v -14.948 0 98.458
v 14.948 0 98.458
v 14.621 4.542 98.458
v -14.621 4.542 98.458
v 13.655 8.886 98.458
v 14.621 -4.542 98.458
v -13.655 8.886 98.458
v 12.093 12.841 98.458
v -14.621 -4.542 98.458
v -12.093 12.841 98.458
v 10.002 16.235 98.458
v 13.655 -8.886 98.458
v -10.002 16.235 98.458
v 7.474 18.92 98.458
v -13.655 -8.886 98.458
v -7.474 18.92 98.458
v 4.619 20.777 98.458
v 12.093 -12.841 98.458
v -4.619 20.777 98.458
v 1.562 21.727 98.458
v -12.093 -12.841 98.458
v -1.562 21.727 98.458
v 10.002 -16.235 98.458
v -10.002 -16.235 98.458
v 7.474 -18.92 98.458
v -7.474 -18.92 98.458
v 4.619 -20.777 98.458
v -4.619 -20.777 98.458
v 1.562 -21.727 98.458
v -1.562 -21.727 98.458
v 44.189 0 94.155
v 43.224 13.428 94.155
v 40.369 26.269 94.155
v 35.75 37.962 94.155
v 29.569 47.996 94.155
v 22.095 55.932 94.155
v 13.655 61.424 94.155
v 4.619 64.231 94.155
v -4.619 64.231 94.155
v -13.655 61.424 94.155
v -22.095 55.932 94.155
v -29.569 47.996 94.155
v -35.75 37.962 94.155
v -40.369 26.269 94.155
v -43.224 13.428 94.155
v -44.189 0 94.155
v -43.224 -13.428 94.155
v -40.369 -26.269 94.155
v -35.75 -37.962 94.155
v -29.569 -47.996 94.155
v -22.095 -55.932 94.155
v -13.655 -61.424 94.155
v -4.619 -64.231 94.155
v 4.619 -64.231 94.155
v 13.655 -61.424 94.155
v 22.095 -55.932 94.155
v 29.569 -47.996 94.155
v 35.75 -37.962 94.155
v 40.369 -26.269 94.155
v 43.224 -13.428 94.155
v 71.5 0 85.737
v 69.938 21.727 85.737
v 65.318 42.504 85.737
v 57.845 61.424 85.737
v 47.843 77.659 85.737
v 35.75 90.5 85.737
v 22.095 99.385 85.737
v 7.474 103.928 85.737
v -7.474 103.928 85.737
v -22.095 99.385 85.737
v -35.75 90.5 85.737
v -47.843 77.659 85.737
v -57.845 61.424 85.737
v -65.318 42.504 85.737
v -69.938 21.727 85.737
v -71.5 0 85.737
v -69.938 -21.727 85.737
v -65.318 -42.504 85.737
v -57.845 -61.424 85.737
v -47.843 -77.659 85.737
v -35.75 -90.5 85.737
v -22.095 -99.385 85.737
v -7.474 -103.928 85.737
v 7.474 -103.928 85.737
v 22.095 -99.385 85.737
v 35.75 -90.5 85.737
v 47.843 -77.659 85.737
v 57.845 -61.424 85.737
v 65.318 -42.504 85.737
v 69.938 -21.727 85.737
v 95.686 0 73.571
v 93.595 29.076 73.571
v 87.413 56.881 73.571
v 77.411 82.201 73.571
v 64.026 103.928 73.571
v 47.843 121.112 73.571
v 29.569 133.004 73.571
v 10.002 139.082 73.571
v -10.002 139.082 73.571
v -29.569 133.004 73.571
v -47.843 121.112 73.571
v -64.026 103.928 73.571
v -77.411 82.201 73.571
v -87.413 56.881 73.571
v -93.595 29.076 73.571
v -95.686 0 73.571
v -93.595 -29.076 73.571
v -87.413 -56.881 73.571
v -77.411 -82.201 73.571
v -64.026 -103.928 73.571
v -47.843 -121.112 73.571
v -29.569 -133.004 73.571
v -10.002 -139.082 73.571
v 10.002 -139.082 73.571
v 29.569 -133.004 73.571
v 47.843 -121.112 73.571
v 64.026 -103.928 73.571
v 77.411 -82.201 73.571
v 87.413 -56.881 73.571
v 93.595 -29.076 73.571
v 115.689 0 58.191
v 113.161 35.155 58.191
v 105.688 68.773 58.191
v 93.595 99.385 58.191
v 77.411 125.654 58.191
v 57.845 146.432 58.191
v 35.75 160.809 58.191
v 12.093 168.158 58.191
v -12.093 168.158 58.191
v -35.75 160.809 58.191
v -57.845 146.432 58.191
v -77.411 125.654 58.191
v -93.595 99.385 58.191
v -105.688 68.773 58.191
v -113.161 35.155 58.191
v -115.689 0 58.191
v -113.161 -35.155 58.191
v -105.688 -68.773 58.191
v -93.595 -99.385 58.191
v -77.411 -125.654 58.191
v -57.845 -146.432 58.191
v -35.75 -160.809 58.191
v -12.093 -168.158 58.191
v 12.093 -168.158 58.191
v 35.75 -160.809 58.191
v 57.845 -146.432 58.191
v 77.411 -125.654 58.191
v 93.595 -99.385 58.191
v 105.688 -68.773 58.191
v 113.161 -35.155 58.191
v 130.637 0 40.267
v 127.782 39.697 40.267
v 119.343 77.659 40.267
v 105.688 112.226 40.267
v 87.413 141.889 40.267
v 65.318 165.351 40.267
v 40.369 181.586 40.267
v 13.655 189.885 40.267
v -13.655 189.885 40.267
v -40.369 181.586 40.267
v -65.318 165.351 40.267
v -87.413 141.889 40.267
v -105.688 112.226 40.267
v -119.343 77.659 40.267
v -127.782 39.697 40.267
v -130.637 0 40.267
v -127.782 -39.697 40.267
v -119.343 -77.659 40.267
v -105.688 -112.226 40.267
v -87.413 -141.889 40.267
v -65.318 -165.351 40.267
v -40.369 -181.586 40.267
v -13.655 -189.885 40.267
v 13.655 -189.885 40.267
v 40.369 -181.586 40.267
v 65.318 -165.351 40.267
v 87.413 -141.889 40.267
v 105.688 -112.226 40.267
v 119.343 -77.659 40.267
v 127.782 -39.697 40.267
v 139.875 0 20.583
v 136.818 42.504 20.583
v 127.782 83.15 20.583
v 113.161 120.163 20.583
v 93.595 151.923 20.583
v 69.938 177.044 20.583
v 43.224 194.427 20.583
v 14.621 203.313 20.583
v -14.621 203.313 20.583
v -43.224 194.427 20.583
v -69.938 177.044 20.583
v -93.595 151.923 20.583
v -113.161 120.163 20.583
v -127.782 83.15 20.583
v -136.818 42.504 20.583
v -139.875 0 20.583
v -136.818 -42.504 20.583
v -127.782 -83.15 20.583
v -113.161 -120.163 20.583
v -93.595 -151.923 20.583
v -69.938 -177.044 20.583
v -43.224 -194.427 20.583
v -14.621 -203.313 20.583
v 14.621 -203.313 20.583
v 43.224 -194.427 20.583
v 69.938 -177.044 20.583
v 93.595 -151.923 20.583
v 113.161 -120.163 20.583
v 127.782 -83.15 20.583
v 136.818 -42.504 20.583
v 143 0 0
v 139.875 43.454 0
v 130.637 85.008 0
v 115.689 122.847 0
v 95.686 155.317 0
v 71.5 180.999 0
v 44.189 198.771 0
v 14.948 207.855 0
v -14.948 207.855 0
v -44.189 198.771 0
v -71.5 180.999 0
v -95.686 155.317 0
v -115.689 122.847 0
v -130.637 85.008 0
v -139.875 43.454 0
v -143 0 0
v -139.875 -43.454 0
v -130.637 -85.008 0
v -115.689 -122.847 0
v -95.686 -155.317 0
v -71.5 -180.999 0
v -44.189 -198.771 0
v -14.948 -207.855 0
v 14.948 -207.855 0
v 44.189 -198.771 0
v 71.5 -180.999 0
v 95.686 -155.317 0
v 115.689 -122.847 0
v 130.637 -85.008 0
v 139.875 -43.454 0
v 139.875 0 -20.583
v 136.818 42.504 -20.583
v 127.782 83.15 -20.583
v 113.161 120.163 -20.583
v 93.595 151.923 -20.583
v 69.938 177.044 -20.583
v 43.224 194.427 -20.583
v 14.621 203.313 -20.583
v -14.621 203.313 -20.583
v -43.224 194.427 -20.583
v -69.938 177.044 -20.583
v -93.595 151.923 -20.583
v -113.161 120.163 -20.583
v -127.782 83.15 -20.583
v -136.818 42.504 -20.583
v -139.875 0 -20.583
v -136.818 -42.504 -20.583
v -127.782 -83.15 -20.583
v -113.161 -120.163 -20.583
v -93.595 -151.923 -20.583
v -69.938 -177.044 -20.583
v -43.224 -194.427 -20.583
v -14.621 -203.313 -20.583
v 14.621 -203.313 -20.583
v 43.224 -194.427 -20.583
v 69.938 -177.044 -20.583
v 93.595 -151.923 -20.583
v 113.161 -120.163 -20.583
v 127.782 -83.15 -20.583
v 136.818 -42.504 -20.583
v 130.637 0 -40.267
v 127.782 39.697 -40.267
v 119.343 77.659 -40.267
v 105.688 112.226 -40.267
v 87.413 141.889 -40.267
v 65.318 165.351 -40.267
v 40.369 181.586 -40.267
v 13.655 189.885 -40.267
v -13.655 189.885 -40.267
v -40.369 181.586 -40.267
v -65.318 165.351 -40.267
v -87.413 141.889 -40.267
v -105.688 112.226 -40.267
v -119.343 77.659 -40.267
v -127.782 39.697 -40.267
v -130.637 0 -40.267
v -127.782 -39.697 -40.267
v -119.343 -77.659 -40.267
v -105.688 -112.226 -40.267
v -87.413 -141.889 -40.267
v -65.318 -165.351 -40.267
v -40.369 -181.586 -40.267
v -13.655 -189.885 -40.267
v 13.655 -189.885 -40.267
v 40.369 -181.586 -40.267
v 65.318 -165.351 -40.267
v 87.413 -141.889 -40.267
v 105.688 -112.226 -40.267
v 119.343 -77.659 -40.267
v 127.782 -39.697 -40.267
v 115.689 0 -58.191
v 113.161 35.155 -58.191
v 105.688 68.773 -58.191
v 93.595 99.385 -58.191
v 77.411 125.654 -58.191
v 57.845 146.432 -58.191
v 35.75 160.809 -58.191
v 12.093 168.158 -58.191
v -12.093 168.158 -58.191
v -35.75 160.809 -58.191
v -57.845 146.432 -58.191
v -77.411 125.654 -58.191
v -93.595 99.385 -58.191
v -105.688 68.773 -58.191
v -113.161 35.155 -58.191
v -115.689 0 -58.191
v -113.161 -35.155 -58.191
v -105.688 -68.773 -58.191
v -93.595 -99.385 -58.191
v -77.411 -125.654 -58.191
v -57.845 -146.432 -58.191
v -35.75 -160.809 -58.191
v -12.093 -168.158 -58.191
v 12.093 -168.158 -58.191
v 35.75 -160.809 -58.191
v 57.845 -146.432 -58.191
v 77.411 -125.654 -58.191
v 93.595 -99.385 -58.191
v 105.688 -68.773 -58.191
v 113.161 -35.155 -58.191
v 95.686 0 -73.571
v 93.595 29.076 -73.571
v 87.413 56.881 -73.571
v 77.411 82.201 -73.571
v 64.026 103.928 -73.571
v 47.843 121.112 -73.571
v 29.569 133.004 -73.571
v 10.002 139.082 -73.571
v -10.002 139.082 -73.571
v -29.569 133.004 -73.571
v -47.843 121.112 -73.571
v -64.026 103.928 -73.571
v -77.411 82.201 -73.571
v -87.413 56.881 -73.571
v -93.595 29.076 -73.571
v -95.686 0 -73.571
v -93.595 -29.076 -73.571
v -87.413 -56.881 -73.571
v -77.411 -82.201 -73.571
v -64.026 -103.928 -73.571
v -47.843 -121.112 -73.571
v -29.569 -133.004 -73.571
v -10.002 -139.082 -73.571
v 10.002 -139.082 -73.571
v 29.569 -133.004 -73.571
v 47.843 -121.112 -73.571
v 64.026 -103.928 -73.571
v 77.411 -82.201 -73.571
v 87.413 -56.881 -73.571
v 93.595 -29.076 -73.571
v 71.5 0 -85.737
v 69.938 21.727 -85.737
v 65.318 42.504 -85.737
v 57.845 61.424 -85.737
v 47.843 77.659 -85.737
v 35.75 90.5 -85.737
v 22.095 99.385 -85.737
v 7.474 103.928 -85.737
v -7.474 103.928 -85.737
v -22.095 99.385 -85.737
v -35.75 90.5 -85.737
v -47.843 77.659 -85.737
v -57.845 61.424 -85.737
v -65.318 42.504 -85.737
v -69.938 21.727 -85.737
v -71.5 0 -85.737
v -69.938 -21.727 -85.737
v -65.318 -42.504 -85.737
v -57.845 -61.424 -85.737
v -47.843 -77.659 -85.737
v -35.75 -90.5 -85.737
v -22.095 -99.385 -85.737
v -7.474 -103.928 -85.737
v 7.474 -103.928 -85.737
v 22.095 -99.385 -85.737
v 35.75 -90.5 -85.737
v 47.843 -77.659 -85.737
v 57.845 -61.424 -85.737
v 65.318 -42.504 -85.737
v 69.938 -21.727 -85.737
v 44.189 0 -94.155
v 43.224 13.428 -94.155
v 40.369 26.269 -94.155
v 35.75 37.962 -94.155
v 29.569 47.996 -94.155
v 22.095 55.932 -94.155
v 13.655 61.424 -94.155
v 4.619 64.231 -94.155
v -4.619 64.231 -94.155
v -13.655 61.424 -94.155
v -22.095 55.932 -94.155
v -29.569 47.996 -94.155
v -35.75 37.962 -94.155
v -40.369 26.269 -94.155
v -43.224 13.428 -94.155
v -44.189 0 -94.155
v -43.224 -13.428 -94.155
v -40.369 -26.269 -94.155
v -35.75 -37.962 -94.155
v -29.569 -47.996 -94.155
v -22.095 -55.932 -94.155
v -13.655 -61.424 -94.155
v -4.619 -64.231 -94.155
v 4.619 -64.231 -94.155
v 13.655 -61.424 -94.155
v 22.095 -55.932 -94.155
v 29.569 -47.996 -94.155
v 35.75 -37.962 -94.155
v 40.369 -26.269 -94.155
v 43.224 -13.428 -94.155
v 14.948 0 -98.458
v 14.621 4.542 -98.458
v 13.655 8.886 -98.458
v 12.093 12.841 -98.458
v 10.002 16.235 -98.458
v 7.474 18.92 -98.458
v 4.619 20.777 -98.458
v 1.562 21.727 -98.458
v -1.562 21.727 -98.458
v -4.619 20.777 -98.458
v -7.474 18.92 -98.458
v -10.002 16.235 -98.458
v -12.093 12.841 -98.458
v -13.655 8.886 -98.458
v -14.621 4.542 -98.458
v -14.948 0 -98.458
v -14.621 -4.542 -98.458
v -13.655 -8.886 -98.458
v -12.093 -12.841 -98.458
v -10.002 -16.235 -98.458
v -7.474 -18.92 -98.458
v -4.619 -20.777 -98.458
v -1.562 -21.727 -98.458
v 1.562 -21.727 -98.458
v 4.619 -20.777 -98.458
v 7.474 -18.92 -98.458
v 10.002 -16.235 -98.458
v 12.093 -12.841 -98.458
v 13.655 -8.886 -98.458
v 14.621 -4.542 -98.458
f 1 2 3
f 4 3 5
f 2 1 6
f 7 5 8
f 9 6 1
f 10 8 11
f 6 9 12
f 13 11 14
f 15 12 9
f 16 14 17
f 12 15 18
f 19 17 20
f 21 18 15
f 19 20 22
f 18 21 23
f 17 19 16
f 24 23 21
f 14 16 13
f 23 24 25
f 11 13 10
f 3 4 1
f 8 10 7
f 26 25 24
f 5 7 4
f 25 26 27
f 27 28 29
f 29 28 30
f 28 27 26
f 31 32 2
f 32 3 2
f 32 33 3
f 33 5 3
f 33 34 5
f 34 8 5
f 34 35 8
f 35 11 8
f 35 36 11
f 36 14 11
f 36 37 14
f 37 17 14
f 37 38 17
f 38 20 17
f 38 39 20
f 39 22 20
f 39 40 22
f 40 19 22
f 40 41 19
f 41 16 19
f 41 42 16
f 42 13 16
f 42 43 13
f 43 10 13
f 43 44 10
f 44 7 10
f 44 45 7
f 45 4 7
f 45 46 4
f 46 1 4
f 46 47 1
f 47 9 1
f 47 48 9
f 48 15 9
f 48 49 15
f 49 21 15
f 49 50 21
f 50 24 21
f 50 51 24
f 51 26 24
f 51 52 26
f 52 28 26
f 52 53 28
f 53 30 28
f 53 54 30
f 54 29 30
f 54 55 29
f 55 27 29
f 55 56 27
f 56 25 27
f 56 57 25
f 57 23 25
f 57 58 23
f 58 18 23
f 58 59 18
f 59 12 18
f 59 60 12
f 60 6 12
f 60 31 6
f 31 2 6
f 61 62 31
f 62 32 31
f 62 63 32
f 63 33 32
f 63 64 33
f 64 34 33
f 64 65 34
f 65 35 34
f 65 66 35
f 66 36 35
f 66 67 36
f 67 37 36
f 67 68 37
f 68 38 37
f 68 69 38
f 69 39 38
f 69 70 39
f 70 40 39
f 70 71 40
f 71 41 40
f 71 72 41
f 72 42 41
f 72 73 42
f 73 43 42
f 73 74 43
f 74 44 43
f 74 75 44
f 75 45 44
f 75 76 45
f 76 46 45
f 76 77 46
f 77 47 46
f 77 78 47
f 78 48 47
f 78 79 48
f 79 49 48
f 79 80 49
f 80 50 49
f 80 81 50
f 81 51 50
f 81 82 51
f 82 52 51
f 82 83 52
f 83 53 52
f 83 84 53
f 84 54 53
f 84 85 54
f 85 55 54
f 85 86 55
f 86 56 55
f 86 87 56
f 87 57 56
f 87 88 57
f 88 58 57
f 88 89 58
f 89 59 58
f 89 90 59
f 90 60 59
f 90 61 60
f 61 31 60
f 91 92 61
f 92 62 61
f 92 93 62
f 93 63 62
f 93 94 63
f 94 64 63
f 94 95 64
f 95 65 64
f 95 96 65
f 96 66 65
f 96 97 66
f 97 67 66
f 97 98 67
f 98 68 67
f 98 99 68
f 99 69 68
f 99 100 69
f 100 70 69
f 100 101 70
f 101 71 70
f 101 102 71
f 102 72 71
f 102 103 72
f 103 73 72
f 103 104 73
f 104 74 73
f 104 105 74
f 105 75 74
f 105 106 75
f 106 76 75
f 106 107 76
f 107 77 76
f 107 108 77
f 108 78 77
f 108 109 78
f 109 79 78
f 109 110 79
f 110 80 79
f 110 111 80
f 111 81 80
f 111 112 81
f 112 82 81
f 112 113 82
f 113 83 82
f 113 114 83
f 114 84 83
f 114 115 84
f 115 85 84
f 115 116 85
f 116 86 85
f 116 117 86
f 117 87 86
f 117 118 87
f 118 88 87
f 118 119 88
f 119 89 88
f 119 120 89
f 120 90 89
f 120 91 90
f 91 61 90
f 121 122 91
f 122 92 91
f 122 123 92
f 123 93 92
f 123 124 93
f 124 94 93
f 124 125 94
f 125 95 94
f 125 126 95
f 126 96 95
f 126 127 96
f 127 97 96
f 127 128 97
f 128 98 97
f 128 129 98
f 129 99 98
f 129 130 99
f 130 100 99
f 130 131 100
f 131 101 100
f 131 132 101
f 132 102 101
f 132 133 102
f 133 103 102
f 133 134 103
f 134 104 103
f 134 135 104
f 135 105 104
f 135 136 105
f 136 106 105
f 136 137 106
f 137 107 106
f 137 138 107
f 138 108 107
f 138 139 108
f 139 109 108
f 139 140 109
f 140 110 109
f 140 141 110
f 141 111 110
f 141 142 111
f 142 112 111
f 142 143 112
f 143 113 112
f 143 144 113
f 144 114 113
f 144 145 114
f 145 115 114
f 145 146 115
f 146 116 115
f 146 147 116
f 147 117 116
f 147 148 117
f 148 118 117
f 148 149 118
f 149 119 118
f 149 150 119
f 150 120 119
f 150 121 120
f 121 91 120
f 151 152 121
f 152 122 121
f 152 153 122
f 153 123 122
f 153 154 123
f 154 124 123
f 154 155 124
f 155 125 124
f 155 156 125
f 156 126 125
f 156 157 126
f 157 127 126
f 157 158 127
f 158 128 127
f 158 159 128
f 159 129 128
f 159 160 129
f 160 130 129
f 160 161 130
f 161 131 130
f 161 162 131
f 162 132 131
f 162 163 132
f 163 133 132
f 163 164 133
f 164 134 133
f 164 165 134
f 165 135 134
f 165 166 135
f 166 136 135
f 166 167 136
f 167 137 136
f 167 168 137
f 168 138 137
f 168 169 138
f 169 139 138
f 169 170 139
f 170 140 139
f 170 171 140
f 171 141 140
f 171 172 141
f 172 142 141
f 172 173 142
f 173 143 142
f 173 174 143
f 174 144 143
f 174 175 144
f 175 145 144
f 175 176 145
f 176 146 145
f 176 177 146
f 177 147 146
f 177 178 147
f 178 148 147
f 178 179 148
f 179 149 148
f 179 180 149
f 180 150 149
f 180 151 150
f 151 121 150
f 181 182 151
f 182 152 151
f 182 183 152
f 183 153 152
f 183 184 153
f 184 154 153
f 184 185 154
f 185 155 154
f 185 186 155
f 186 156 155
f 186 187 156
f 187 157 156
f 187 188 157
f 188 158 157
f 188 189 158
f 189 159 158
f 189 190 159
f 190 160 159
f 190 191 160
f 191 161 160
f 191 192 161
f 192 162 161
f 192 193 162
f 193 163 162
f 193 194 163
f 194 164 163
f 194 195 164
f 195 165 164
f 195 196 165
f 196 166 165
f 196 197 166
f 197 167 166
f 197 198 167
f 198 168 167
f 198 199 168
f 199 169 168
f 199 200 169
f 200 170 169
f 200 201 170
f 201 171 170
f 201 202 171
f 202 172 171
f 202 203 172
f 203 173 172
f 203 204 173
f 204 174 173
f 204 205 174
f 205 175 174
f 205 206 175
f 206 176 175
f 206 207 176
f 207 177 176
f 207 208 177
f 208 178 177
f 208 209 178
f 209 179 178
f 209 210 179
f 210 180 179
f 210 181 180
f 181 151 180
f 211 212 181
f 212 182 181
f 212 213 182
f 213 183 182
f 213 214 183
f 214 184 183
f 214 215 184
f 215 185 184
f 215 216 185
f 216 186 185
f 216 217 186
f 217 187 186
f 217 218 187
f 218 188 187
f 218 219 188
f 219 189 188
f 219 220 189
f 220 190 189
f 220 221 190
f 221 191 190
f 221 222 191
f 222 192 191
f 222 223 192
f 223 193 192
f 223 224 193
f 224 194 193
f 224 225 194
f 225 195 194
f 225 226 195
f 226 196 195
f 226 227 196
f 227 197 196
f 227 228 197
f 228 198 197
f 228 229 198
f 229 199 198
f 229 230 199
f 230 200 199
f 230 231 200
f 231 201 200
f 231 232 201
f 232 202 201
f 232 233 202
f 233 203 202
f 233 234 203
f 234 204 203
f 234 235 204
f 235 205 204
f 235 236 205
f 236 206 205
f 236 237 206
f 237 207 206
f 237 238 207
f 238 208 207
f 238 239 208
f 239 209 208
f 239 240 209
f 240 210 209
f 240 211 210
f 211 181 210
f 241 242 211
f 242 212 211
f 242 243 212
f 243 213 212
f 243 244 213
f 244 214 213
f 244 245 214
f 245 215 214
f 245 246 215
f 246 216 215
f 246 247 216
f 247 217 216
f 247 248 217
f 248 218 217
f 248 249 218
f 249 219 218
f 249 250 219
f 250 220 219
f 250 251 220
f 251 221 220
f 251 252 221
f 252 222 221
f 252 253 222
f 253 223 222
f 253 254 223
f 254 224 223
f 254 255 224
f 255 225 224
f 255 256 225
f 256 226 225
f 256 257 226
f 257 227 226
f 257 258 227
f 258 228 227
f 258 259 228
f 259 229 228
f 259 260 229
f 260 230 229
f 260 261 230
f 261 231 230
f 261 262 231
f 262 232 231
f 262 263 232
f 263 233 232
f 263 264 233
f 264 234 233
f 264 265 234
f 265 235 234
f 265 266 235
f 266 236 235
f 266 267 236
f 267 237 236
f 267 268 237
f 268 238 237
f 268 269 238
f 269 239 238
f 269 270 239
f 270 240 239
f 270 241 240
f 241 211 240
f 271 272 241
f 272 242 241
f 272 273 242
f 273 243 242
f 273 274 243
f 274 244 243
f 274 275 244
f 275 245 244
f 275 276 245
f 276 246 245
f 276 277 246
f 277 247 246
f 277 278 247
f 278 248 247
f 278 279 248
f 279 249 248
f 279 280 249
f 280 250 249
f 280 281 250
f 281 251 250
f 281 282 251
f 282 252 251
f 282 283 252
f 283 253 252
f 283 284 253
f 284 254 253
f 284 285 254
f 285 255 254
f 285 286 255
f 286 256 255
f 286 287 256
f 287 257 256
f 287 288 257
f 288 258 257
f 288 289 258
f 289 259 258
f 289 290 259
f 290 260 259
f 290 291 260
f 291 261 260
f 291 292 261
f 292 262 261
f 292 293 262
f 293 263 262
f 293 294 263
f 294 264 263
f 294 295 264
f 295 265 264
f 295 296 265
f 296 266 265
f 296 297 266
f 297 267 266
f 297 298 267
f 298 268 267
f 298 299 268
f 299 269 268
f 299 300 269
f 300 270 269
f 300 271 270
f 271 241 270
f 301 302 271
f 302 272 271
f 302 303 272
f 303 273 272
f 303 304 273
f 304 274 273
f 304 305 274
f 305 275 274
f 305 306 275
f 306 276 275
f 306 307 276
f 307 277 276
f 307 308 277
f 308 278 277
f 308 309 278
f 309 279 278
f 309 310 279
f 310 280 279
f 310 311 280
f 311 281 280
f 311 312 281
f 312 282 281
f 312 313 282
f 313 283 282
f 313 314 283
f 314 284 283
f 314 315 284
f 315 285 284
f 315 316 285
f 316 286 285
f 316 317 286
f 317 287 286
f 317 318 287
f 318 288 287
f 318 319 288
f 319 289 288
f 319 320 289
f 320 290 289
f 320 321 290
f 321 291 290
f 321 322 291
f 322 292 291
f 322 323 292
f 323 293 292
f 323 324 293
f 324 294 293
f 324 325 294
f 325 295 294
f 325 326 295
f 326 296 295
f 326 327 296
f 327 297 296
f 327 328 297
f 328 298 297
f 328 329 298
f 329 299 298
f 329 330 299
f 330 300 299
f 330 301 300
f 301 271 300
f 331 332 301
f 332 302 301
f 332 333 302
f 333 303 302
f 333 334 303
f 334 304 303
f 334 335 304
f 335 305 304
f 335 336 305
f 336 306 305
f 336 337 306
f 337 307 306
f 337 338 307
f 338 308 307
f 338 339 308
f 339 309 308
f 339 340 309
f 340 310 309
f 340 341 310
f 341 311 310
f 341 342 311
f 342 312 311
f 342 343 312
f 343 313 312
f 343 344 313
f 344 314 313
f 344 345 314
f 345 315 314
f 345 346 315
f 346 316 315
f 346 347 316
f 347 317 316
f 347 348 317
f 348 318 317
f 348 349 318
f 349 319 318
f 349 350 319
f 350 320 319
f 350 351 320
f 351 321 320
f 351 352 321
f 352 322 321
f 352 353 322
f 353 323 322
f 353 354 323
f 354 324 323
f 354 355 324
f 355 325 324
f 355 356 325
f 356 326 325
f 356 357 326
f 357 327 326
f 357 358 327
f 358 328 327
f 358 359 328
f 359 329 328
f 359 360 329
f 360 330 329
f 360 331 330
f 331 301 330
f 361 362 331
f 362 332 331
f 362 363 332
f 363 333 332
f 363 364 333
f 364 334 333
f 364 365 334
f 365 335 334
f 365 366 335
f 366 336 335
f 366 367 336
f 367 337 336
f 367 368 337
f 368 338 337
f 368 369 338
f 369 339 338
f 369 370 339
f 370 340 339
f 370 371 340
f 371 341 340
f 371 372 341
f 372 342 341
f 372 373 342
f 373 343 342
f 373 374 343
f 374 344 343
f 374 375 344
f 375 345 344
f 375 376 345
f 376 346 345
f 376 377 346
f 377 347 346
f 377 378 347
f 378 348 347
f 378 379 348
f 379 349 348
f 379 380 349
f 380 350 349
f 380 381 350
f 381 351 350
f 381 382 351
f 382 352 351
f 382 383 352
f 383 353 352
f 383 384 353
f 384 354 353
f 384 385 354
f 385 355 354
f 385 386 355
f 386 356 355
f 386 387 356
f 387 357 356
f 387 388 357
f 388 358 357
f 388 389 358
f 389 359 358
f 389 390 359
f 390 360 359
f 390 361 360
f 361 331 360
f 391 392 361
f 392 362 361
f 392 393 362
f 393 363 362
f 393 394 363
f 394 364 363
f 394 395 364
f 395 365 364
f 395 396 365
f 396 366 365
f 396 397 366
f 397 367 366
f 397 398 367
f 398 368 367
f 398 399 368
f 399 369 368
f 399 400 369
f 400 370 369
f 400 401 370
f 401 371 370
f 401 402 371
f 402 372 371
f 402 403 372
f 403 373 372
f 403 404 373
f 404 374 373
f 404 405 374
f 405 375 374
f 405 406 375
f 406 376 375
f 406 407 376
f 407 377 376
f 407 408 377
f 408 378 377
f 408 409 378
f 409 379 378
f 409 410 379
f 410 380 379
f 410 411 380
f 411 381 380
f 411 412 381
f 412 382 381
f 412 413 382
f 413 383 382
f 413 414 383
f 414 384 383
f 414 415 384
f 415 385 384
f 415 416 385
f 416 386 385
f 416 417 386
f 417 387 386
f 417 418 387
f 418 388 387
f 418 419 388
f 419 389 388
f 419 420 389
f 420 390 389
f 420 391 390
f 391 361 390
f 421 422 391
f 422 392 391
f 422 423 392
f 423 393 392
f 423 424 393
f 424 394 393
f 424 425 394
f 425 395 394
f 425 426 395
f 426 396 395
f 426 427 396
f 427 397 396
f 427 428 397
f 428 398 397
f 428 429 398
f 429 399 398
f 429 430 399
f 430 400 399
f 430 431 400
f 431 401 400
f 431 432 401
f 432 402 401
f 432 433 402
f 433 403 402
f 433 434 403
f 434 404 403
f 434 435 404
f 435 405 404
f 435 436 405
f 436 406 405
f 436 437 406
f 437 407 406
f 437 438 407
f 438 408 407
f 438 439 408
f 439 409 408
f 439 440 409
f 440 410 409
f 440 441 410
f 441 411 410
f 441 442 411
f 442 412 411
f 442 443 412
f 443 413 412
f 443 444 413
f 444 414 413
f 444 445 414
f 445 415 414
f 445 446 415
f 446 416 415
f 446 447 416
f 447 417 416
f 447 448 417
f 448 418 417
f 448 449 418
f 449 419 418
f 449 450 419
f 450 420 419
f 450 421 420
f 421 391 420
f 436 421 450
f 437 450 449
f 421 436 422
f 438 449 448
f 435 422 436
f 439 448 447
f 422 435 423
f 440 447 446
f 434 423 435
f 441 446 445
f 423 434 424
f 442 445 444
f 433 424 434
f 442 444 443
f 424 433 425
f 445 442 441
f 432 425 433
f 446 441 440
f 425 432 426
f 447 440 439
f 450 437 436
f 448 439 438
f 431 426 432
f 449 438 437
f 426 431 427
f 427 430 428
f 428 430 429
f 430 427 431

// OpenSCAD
// Generated by SolidPython 1.0.1 on 2020-07-29 00:46:51


scale(v = [13, 19, 9]) {
	sphere(r = 11);
}
/***********************************************
*********      SolidPython code:      **********
************************************************
 
# import packages: SolidPython
from solid import *
from solid.utils import *
from itertools import chain, combinations, permutations


class Resize:

    def __init__(self, scad_file):
        self.scad_file = scad_file
        #self.scad_file = import_scad(scad_file)
        # cone/cylinder param:
        self.r1 = 0
        self.r2 = 0
        self.h = 0
        # rectangular prism param:
        self.w = 0
        self.l = 0
        # ellipse param:
        self.r = 0

    # import OpenScad code (file name corresponds to shape)


    # classify shape + parameters
    def assign(self, param1, param2, param3):
        if self.scad_file == 'cone.scad':
            self.r1 = param1
            self.r2 = param2
            self.h = param3
        elif self.scad_file == 'cylinder.scad':
            self.r1 = param1
            self.r2 = param2
            self.h = param3
        elif self.scad_file == 'rectangularPrism.scad':
            self.h = param1
            self.l = param2
            self.w = param3
        else:
            self.r = param1
            self.h = param2

    # resize parameters
    def iterate(self):
        x = range(3, 20, 2)
        i = 1
        if self.scad_file == 'cone.scad':
            tempList = list(permutations(x, 2))
            for temp in tempList:
                param1 = temp[0]
                param2 = temp[1]
                filepath = 'produced_scad_files/' + 'cone' + str(param1) + '_' + str(param2) + '_' + '.scad'
                scad_render_to_file(cylinder(h=param1, r1=param2, r2=0), filepath)

        elif self.scad_file == 'cylinder.scad':
            tempList = list(permutations(x, 3))
            for temp in tempList:
                param1 = temp[0]
                param2 = temp[1]
                filepath = 'produced_scad_files/' + 'cylinder' + str(param1) + '_' + str(param2) + '_' + '.scad'
                scad_render_to_file(cylinder(h=param1, r1=param2, r2=param2), filepath)

        elif self.scad_file == 'rectangularPrism.scad':
            tempList = list(permutations(x, 3))
            for temp in tempList:
                param1 = temp[0]
                param2 = temp[1]
                param3 = temp[2]
                filepath = 'produced_scad_files/' + 'rectangularPrism' + str(param1) + '_' + str(param2) + '_' + str(
                    param3) + '.scad'
                scad_render_to_file(cube(size=(param1, param2, param3)), filepath)

        elif self.scad_file == 'ellipse.scad':
            tempList = list(permutations(x, 4))
            for temp in tempList:
                param1 = temp[0]
                param2 = temp[1]
                param3 = temp[2]
                param4 = temp[3]
                filepath = 'produced_scad_files/' + 'ellipse' + str(param1) + '_' + str(param2) + '_' + str(param3) + '_' + str(param4) + '.scad'
                scad_render_to_file(scale([param1, param2, param3])(sphere(r=param4)), filepath)

    def render_to_scadfile(self):
        scad_render_to_file(scad, 'example.scad') 
 
************************************************/
